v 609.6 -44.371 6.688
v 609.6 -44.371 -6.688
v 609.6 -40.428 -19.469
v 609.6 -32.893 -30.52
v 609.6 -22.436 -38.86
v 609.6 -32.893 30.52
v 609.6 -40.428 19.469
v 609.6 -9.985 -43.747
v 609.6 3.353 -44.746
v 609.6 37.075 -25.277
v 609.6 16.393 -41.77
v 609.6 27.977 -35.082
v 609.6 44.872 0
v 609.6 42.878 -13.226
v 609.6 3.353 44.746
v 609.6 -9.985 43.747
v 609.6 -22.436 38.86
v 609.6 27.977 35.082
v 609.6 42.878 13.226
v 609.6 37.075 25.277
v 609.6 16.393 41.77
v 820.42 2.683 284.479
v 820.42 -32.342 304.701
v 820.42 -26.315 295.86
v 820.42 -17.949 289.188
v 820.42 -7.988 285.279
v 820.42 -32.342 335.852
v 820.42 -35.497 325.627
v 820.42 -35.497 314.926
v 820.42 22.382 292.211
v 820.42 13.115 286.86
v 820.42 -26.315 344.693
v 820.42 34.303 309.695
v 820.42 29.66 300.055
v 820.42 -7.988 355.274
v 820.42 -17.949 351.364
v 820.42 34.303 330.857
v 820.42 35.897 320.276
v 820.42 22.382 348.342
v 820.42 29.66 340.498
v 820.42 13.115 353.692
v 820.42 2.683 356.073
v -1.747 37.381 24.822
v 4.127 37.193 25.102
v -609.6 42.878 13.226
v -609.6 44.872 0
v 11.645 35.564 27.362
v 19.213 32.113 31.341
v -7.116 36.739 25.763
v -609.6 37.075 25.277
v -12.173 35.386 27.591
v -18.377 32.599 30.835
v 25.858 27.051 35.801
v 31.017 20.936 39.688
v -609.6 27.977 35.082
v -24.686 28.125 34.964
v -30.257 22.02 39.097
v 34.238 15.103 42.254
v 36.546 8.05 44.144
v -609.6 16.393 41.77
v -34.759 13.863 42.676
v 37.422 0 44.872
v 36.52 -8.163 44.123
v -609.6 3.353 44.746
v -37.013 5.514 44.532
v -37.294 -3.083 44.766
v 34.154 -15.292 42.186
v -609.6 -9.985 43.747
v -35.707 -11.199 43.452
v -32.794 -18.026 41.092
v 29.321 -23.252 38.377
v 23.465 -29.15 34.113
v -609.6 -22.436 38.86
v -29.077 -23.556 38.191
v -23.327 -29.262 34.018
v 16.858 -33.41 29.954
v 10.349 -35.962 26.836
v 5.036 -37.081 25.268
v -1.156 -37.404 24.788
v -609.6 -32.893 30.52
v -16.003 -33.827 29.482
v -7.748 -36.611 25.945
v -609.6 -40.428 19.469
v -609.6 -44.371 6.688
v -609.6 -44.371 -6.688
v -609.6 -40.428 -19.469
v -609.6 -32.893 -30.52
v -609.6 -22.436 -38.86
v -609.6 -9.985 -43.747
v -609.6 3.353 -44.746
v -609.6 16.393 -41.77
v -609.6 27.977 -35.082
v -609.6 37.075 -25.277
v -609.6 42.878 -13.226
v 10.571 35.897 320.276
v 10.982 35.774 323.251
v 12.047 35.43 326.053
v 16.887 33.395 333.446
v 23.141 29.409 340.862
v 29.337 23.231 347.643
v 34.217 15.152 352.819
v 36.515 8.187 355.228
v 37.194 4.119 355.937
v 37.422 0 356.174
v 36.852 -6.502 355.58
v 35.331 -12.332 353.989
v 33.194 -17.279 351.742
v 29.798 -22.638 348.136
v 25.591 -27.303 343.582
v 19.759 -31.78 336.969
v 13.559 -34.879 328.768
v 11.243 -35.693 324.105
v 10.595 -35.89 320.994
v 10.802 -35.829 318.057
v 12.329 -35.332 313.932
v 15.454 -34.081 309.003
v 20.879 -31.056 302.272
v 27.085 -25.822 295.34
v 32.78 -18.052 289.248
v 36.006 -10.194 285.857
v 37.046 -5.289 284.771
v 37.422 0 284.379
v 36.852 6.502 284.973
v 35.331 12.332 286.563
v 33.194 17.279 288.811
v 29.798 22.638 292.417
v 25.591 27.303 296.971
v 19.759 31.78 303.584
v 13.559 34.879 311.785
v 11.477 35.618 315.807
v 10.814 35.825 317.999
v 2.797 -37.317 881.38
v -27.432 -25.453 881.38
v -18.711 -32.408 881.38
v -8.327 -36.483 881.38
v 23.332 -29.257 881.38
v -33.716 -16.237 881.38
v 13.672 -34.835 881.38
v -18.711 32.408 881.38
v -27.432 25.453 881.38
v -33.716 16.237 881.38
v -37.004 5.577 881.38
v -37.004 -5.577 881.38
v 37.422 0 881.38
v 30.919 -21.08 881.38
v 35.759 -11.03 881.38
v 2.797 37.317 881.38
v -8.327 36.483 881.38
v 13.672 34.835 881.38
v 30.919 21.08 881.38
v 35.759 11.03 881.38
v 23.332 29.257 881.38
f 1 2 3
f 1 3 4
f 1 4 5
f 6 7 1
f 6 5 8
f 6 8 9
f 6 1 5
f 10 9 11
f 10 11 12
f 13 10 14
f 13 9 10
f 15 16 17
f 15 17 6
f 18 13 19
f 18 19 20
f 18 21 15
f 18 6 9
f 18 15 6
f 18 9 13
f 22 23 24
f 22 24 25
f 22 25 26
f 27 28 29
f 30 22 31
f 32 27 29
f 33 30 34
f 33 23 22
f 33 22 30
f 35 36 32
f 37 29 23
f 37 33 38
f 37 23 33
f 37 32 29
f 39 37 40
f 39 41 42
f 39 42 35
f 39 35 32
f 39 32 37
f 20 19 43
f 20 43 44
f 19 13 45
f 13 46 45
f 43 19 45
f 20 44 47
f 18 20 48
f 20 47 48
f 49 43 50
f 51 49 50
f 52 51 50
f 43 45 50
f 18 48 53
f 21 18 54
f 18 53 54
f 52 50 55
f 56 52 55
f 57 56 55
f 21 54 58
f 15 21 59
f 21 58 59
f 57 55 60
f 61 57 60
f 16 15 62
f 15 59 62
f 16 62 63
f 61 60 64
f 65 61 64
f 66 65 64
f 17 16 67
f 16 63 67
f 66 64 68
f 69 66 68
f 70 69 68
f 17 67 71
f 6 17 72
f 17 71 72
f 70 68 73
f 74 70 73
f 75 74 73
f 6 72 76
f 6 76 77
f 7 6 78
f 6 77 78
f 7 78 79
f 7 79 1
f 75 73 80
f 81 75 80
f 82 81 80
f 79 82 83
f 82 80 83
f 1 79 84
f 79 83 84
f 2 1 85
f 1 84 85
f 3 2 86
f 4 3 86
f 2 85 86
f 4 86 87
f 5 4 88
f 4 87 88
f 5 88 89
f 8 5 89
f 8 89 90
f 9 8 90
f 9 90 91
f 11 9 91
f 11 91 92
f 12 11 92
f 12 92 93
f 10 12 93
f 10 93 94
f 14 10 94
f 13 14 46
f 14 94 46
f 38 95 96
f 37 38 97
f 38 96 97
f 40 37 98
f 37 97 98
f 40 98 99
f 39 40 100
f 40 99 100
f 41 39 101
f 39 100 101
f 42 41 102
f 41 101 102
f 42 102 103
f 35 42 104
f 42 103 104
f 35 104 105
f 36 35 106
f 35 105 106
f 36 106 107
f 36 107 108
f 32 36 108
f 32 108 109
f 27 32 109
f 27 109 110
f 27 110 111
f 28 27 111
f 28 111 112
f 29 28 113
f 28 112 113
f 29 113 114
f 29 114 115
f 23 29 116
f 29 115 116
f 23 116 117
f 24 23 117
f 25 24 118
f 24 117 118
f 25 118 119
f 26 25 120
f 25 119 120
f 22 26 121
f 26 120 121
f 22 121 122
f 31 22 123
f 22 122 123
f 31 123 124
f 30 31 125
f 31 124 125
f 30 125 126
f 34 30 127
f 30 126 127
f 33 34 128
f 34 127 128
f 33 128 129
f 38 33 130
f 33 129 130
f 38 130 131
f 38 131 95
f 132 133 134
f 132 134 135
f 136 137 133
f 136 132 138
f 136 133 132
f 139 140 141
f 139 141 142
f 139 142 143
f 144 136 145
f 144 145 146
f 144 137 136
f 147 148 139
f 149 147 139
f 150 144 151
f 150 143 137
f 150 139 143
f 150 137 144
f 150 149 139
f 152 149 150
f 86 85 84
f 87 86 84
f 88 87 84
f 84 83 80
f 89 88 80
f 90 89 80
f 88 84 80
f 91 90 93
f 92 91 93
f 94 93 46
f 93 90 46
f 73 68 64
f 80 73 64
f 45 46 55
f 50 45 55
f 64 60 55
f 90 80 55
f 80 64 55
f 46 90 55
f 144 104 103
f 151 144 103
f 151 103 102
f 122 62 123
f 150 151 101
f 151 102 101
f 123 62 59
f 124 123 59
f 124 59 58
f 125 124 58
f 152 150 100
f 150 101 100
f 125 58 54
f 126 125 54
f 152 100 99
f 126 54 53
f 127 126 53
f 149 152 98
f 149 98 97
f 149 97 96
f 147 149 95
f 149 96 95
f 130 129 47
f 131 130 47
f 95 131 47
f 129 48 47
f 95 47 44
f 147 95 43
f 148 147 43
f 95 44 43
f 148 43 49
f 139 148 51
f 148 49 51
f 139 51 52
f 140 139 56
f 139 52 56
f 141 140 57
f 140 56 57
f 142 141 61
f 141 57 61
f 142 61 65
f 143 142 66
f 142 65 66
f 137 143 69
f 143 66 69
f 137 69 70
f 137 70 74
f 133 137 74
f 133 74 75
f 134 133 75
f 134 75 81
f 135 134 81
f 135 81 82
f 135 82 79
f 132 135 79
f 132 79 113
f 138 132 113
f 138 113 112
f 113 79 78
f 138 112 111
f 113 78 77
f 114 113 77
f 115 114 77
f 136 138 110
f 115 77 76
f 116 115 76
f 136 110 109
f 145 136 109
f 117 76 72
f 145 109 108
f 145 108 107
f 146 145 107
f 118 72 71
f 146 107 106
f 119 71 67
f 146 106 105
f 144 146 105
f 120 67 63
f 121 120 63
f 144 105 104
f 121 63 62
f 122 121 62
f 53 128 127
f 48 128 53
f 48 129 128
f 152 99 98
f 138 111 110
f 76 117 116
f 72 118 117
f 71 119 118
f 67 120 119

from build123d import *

# Parameters (mm, degrees)
F0_R          = 23.1250603282
F1_DEPTH      = 711.2
F2_R          = 44.8716829259
F3_DEPTH      = 609.6
F3_DEPTH_BACK = 609.6
F4_R          = 37.4216193061
F5_DEPTH      = 881.38
F8_R          = 35.8974591154
F9_DEPTH      = 820.42


# Not quite as in the source:
# - a feature of the source that left no trace in its solid (it failed there, or was rolled back) is left out


with BuildPart() as f1:
    # F0 (on Top) → F1 (new body)
    with BuildSketch(Plane.XY):
        Circle(F0_R)
    extrude(amount=F1_DEPTH)

    # F2 (on Right) → F3 (join, two sides)
    with BuildSketch(Plane.YZ) as f3_sk:
        Circle(F2_R)
    extrude(amount=F3_DEPTH)
    extrude(f3_sk.sketch, amount=-F3_DEPTH_BACK)

    # F4 (on Top) → F5 (join)
    with BuildSketch(Plane.XY):
        Circle(F4_R)
    extrude(amount=F5_DEPTH)

    # F8 (on Right) → F9 (join)
    with BuildSketch(Plane.YZ):
        with Locations((0, 320.2763795853)):
            Circle(F8_R)
    extrude(amount=F9_DEPTH)


solid = f1.part
